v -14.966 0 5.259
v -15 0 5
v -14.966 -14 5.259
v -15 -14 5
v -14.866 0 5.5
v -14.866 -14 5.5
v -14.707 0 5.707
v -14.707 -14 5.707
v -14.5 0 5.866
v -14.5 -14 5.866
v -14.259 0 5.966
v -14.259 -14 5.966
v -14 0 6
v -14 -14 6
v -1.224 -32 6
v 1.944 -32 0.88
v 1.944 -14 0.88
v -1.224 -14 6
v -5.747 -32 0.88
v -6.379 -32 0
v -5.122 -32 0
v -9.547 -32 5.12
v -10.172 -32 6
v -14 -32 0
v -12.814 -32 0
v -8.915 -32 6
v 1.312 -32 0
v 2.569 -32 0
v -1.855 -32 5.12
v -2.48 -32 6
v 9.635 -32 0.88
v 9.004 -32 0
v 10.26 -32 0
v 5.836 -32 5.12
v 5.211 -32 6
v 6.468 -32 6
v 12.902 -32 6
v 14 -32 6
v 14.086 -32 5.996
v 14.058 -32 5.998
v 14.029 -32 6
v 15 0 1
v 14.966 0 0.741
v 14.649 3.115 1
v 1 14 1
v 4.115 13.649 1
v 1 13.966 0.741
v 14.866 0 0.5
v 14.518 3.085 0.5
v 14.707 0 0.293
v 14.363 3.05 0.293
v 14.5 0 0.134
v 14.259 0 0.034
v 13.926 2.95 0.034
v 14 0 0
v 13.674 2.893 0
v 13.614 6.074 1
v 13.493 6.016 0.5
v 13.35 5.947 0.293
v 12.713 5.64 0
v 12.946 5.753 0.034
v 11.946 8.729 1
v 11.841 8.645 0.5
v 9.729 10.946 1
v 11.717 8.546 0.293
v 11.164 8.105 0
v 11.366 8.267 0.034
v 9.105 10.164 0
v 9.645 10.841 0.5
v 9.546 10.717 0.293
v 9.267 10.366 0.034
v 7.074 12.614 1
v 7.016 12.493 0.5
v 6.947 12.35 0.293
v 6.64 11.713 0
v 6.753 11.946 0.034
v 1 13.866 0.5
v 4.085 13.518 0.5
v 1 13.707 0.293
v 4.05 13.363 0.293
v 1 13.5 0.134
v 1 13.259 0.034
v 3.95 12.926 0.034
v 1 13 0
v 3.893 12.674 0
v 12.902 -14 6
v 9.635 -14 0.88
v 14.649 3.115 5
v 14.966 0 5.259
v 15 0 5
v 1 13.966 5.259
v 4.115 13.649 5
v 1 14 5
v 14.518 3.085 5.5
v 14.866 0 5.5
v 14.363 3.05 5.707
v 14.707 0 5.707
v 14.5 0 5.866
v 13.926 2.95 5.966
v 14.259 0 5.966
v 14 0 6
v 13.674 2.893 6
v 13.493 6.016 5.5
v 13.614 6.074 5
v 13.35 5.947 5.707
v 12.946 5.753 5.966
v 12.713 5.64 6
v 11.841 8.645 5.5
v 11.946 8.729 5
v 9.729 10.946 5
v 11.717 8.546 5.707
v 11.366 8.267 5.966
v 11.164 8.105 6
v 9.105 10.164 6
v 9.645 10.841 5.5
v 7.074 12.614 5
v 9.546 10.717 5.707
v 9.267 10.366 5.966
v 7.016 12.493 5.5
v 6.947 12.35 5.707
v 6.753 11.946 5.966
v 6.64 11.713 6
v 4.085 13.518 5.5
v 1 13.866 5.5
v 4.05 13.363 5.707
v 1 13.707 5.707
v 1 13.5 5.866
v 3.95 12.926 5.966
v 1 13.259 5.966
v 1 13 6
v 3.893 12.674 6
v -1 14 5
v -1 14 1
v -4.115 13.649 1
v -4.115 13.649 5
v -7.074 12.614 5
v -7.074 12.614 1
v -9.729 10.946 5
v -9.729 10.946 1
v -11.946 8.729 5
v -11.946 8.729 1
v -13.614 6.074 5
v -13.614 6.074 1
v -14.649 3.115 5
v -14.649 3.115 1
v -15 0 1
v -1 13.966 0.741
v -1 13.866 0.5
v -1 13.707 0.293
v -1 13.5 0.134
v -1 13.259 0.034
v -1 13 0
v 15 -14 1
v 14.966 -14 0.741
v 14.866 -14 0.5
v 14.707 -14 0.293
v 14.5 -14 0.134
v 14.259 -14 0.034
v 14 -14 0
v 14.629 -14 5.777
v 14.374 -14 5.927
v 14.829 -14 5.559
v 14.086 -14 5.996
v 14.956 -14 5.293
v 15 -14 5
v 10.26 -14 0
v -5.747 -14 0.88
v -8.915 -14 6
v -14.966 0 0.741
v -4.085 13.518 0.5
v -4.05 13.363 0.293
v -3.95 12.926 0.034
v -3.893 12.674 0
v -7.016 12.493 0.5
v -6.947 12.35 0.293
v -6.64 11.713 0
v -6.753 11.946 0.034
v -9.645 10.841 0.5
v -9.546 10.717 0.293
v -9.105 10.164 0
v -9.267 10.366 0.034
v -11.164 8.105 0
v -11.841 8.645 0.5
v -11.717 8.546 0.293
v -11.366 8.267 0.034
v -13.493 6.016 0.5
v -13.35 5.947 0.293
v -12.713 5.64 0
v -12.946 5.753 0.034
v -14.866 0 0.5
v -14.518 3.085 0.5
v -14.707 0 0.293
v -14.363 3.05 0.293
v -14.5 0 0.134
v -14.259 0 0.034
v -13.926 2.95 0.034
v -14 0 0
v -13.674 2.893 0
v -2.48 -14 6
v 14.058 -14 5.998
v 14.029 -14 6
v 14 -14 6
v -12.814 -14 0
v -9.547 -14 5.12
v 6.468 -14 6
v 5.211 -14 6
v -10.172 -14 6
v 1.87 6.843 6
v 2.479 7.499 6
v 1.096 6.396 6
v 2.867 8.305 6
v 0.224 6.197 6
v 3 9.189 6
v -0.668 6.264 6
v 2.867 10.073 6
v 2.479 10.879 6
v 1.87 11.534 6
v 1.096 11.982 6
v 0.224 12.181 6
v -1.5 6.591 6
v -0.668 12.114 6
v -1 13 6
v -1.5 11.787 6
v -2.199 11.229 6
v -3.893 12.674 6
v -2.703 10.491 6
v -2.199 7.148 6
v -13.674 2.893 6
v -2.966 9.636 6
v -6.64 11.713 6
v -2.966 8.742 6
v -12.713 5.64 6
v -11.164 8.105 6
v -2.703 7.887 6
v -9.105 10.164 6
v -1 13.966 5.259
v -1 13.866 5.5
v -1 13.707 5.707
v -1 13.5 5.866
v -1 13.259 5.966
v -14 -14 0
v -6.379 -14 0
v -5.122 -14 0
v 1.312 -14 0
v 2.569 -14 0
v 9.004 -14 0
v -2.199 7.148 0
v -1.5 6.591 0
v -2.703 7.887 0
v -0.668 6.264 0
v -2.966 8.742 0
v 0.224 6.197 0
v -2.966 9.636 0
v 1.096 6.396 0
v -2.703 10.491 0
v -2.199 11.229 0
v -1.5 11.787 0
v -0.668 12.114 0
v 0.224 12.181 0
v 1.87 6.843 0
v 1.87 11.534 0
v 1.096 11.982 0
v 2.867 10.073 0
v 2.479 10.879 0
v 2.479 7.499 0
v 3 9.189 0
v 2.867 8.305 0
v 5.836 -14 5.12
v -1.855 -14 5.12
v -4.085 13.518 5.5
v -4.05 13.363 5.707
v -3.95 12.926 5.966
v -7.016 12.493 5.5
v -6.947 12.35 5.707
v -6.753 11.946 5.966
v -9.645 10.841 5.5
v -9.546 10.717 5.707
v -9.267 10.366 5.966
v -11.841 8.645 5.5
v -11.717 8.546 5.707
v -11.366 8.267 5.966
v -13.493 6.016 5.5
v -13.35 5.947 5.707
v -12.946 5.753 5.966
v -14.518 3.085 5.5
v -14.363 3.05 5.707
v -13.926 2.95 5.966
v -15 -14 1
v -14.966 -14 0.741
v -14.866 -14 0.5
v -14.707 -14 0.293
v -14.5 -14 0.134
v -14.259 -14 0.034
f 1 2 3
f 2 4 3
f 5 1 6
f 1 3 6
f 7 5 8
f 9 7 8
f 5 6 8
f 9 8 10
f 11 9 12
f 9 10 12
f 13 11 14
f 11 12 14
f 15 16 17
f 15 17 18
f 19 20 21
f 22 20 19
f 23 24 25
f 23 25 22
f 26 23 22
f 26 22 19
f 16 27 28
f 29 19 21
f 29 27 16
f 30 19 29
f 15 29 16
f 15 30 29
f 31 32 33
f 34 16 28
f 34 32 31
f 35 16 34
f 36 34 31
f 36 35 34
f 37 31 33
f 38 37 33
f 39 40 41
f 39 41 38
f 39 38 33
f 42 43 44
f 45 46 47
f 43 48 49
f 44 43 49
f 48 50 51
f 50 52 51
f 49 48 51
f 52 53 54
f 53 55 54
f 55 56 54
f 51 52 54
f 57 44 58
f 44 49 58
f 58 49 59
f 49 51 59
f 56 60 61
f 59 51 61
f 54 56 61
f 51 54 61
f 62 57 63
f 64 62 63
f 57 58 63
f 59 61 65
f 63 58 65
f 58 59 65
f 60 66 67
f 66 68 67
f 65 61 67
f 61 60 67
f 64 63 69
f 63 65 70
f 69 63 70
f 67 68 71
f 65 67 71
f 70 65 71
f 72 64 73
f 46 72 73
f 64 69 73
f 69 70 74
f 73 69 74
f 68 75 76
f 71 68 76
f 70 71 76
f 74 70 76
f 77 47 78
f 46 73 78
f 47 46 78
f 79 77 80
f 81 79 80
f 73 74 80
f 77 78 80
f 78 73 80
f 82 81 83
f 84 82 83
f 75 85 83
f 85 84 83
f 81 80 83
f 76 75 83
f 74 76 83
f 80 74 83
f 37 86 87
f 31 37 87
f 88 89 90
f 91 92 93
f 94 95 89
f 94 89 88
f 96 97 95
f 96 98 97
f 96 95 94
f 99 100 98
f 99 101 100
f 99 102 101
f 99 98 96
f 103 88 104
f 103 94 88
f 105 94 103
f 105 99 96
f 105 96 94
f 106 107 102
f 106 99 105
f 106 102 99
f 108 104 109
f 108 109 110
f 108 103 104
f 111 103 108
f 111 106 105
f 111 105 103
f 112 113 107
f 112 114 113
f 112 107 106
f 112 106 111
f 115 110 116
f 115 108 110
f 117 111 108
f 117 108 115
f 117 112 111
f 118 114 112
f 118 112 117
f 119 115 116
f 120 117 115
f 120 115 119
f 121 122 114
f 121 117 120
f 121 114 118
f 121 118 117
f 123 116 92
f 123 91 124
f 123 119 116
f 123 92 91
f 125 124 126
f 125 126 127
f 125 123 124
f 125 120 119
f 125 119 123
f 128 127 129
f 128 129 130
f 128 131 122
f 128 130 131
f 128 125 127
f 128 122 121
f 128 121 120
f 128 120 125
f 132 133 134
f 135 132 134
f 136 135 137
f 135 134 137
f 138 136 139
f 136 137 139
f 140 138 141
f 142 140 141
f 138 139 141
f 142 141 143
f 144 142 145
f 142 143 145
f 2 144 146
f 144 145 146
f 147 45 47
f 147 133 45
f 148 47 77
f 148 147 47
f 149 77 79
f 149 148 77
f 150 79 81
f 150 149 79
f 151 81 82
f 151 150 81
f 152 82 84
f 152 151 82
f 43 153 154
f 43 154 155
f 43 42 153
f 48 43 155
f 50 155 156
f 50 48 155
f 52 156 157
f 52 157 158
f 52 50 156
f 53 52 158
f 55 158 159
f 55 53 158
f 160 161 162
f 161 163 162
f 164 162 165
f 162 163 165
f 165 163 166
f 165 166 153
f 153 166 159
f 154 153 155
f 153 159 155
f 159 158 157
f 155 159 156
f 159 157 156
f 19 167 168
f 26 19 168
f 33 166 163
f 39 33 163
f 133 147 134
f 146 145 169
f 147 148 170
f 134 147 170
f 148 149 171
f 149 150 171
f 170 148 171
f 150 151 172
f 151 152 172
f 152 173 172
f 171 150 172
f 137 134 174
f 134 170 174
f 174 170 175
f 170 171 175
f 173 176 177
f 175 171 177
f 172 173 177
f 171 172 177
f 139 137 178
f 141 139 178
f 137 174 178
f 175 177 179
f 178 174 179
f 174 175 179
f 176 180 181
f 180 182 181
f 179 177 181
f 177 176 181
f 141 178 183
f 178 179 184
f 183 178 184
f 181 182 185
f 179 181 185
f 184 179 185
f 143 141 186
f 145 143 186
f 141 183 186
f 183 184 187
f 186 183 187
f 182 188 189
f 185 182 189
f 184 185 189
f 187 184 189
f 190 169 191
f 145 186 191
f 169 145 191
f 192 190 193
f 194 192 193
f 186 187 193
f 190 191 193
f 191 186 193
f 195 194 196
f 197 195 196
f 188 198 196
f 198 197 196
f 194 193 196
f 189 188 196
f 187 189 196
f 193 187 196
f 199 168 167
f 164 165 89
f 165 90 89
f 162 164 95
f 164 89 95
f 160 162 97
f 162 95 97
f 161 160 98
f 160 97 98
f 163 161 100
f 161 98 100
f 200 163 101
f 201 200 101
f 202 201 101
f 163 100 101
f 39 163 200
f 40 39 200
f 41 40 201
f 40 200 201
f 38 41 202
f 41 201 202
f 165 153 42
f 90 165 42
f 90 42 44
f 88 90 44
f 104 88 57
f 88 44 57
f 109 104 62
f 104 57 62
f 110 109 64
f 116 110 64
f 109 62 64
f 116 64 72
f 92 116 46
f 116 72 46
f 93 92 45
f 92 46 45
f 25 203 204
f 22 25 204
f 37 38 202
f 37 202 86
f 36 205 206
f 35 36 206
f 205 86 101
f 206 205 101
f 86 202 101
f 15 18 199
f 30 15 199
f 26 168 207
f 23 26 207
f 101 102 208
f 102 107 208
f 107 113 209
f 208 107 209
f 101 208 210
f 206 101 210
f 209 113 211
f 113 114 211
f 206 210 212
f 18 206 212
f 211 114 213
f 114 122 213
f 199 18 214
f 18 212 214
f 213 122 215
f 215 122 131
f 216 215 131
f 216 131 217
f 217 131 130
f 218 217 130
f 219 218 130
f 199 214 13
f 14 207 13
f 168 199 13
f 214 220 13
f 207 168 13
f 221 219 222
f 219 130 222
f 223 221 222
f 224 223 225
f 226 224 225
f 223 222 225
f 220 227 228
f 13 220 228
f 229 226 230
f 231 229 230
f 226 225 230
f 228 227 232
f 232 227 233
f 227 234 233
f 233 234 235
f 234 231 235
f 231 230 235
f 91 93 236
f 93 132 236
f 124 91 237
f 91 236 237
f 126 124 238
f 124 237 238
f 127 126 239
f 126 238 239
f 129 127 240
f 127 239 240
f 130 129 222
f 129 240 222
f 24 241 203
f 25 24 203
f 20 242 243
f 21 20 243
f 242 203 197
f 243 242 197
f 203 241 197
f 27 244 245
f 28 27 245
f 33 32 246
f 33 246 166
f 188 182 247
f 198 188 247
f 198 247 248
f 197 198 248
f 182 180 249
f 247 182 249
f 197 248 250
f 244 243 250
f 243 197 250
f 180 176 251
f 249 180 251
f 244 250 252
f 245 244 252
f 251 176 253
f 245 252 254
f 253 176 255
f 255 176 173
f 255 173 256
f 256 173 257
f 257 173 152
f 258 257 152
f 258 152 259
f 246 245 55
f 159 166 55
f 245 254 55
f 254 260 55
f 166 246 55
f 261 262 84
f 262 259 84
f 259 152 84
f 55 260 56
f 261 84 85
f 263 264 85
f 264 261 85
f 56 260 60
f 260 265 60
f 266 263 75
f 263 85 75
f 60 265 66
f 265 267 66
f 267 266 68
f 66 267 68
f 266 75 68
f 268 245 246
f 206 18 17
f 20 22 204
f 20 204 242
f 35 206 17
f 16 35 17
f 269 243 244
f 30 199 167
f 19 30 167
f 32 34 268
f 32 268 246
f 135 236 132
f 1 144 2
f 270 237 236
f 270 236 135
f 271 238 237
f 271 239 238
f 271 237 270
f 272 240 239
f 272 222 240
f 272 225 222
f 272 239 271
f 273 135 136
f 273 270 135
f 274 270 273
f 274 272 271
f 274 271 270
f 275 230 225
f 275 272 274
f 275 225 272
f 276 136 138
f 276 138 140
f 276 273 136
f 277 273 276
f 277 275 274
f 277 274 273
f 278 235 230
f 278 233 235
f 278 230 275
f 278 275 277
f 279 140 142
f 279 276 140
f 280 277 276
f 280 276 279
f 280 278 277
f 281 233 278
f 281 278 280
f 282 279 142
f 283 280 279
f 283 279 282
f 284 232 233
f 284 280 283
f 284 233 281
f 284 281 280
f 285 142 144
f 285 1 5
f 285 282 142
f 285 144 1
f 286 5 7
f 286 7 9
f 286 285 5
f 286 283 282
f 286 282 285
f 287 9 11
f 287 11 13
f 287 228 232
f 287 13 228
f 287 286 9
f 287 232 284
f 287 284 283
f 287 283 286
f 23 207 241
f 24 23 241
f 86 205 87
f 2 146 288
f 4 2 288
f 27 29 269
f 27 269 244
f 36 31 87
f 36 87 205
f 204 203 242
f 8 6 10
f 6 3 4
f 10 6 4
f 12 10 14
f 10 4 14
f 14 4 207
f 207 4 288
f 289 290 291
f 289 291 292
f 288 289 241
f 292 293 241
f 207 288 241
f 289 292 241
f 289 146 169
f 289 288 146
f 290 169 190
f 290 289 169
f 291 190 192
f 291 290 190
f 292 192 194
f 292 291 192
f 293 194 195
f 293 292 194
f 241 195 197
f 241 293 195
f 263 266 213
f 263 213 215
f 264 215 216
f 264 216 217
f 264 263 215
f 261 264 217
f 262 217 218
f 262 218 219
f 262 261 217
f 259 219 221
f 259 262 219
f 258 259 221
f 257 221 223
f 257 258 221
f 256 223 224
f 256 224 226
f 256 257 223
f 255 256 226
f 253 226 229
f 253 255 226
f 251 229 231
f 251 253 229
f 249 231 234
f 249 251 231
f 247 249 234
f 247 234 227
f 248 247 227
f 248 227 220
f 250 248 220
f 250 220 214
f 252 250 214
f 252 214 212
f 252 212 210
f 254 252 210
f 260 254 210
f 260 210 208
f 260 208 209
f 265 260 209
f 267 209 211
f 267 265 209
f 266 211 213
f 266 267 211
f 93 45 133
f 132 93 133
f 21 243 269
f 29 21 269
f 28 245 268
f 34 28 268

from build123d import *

# Parameters (mm, degrees)
F0_R     = 3
F1_DEPTH = 6
F3_R     = 1
F5_DEPTH = 18


with BuildPart() as f1:
    # F0 (on Top) → F1 (new body)
    with BuildSketch(Plane.XY):
        with BuildLine():
            Line((-15, -14), (15, -14))
            Line((15, -14), (15, 0))
            ThreePointArc((15, 0), (10.8994949366, 9.8994949366), (1, 14))
            Line((1, 14), (-1, 14))
            ThreePointArc((-1, 14), (-10.8994949366, 9.8994949366), (-15, 0))
            Line((-15, 0), (-15, -14))
        make_face()
        with Locations((0, 9.1889705509)):
            Circle(F0_R, mode=Mode.SUBTRACT)
    extrude(amount=F1_DEPTH)

    # F3
    f3_edges = [f1.edges().sort_by_distance(p)[0] for p in [
        (-10.899495, 9.899495, 6),
        (10.899495, 9.899495, 6),
        (-15, -7, 6),
        (15, -7, 6),
        (-15, -7, 0),
        (-10.899495, 9.899495, 0),
        (10.899495, 9.899495, 0),
        (15, -7, 0),
    ]]
    fillet(f3_edges, radius=F3_R)

    # F4 (on face) → F5 (join)
    with BuildSketch(Plane.XZ.offset(14)):
        with BuildLine():
            Line((-10.1717880173, 6), (-14, 0))
            Line((-14, 0), (-12.8137921418, 0))
            Line((-12.8137921418, 0), (-9.5468121047, 5.120374815))
            Line((-9.5468121047, 5.120374815), (-6.3790735405, 0))
            Line((-6.3790735405, 0), (-5.122384561, 0))
            Line((-5.122384561, 0), (-1.8554045239, 5.120374815))
            Line((-1.8554045239, 5.120374815), (1.3123340403, 0))
            Line((1.3123340403, 0), (2.5690230199, 0))
            Line((2.5690230199, 0), (5.836003057, 5.120374815))
            Line((5.836003057, 5.120374815), (9.0037416211, 0))
            Line((9.0037416211, 0), (10.2604306007, 0))
            Line((10.2604306007, 0), (14.0862641777, 5.9962722979))
            ThreePointArc((14.0862641777, 5.9962722979), (14.043172341, 5.9990676398), (14, 6))
            Line((14, 6), (12.9024347251, 6))
            Line((12.9024347251, 6), (9.635454688, 0.879625185))
            Line((9.635454688, 0.879625185), (6.4677161239, 6))
            Line((6.4677161239, 6), (5.2110271443, 6))
            Line((5.2110271443, 6), (1.9440471072, 0.879625185))
            Line((1.9440471072, 0.879625185), (-1.223691457, 6))
            Line((-1.223691457, 6), (-2.4803804365, 6))
            Line((-2.4803804365, 6), (-5.7473604736, 0.879625185))
            Line((-5.7473604736, 0.879625185), (-8.9150990378, 6))
            Line((-8.9150990378, 6), (-10.1717880173, 6))
        make_face()
    extrude(amount=F5_DEPTH)


solid = f1.part
